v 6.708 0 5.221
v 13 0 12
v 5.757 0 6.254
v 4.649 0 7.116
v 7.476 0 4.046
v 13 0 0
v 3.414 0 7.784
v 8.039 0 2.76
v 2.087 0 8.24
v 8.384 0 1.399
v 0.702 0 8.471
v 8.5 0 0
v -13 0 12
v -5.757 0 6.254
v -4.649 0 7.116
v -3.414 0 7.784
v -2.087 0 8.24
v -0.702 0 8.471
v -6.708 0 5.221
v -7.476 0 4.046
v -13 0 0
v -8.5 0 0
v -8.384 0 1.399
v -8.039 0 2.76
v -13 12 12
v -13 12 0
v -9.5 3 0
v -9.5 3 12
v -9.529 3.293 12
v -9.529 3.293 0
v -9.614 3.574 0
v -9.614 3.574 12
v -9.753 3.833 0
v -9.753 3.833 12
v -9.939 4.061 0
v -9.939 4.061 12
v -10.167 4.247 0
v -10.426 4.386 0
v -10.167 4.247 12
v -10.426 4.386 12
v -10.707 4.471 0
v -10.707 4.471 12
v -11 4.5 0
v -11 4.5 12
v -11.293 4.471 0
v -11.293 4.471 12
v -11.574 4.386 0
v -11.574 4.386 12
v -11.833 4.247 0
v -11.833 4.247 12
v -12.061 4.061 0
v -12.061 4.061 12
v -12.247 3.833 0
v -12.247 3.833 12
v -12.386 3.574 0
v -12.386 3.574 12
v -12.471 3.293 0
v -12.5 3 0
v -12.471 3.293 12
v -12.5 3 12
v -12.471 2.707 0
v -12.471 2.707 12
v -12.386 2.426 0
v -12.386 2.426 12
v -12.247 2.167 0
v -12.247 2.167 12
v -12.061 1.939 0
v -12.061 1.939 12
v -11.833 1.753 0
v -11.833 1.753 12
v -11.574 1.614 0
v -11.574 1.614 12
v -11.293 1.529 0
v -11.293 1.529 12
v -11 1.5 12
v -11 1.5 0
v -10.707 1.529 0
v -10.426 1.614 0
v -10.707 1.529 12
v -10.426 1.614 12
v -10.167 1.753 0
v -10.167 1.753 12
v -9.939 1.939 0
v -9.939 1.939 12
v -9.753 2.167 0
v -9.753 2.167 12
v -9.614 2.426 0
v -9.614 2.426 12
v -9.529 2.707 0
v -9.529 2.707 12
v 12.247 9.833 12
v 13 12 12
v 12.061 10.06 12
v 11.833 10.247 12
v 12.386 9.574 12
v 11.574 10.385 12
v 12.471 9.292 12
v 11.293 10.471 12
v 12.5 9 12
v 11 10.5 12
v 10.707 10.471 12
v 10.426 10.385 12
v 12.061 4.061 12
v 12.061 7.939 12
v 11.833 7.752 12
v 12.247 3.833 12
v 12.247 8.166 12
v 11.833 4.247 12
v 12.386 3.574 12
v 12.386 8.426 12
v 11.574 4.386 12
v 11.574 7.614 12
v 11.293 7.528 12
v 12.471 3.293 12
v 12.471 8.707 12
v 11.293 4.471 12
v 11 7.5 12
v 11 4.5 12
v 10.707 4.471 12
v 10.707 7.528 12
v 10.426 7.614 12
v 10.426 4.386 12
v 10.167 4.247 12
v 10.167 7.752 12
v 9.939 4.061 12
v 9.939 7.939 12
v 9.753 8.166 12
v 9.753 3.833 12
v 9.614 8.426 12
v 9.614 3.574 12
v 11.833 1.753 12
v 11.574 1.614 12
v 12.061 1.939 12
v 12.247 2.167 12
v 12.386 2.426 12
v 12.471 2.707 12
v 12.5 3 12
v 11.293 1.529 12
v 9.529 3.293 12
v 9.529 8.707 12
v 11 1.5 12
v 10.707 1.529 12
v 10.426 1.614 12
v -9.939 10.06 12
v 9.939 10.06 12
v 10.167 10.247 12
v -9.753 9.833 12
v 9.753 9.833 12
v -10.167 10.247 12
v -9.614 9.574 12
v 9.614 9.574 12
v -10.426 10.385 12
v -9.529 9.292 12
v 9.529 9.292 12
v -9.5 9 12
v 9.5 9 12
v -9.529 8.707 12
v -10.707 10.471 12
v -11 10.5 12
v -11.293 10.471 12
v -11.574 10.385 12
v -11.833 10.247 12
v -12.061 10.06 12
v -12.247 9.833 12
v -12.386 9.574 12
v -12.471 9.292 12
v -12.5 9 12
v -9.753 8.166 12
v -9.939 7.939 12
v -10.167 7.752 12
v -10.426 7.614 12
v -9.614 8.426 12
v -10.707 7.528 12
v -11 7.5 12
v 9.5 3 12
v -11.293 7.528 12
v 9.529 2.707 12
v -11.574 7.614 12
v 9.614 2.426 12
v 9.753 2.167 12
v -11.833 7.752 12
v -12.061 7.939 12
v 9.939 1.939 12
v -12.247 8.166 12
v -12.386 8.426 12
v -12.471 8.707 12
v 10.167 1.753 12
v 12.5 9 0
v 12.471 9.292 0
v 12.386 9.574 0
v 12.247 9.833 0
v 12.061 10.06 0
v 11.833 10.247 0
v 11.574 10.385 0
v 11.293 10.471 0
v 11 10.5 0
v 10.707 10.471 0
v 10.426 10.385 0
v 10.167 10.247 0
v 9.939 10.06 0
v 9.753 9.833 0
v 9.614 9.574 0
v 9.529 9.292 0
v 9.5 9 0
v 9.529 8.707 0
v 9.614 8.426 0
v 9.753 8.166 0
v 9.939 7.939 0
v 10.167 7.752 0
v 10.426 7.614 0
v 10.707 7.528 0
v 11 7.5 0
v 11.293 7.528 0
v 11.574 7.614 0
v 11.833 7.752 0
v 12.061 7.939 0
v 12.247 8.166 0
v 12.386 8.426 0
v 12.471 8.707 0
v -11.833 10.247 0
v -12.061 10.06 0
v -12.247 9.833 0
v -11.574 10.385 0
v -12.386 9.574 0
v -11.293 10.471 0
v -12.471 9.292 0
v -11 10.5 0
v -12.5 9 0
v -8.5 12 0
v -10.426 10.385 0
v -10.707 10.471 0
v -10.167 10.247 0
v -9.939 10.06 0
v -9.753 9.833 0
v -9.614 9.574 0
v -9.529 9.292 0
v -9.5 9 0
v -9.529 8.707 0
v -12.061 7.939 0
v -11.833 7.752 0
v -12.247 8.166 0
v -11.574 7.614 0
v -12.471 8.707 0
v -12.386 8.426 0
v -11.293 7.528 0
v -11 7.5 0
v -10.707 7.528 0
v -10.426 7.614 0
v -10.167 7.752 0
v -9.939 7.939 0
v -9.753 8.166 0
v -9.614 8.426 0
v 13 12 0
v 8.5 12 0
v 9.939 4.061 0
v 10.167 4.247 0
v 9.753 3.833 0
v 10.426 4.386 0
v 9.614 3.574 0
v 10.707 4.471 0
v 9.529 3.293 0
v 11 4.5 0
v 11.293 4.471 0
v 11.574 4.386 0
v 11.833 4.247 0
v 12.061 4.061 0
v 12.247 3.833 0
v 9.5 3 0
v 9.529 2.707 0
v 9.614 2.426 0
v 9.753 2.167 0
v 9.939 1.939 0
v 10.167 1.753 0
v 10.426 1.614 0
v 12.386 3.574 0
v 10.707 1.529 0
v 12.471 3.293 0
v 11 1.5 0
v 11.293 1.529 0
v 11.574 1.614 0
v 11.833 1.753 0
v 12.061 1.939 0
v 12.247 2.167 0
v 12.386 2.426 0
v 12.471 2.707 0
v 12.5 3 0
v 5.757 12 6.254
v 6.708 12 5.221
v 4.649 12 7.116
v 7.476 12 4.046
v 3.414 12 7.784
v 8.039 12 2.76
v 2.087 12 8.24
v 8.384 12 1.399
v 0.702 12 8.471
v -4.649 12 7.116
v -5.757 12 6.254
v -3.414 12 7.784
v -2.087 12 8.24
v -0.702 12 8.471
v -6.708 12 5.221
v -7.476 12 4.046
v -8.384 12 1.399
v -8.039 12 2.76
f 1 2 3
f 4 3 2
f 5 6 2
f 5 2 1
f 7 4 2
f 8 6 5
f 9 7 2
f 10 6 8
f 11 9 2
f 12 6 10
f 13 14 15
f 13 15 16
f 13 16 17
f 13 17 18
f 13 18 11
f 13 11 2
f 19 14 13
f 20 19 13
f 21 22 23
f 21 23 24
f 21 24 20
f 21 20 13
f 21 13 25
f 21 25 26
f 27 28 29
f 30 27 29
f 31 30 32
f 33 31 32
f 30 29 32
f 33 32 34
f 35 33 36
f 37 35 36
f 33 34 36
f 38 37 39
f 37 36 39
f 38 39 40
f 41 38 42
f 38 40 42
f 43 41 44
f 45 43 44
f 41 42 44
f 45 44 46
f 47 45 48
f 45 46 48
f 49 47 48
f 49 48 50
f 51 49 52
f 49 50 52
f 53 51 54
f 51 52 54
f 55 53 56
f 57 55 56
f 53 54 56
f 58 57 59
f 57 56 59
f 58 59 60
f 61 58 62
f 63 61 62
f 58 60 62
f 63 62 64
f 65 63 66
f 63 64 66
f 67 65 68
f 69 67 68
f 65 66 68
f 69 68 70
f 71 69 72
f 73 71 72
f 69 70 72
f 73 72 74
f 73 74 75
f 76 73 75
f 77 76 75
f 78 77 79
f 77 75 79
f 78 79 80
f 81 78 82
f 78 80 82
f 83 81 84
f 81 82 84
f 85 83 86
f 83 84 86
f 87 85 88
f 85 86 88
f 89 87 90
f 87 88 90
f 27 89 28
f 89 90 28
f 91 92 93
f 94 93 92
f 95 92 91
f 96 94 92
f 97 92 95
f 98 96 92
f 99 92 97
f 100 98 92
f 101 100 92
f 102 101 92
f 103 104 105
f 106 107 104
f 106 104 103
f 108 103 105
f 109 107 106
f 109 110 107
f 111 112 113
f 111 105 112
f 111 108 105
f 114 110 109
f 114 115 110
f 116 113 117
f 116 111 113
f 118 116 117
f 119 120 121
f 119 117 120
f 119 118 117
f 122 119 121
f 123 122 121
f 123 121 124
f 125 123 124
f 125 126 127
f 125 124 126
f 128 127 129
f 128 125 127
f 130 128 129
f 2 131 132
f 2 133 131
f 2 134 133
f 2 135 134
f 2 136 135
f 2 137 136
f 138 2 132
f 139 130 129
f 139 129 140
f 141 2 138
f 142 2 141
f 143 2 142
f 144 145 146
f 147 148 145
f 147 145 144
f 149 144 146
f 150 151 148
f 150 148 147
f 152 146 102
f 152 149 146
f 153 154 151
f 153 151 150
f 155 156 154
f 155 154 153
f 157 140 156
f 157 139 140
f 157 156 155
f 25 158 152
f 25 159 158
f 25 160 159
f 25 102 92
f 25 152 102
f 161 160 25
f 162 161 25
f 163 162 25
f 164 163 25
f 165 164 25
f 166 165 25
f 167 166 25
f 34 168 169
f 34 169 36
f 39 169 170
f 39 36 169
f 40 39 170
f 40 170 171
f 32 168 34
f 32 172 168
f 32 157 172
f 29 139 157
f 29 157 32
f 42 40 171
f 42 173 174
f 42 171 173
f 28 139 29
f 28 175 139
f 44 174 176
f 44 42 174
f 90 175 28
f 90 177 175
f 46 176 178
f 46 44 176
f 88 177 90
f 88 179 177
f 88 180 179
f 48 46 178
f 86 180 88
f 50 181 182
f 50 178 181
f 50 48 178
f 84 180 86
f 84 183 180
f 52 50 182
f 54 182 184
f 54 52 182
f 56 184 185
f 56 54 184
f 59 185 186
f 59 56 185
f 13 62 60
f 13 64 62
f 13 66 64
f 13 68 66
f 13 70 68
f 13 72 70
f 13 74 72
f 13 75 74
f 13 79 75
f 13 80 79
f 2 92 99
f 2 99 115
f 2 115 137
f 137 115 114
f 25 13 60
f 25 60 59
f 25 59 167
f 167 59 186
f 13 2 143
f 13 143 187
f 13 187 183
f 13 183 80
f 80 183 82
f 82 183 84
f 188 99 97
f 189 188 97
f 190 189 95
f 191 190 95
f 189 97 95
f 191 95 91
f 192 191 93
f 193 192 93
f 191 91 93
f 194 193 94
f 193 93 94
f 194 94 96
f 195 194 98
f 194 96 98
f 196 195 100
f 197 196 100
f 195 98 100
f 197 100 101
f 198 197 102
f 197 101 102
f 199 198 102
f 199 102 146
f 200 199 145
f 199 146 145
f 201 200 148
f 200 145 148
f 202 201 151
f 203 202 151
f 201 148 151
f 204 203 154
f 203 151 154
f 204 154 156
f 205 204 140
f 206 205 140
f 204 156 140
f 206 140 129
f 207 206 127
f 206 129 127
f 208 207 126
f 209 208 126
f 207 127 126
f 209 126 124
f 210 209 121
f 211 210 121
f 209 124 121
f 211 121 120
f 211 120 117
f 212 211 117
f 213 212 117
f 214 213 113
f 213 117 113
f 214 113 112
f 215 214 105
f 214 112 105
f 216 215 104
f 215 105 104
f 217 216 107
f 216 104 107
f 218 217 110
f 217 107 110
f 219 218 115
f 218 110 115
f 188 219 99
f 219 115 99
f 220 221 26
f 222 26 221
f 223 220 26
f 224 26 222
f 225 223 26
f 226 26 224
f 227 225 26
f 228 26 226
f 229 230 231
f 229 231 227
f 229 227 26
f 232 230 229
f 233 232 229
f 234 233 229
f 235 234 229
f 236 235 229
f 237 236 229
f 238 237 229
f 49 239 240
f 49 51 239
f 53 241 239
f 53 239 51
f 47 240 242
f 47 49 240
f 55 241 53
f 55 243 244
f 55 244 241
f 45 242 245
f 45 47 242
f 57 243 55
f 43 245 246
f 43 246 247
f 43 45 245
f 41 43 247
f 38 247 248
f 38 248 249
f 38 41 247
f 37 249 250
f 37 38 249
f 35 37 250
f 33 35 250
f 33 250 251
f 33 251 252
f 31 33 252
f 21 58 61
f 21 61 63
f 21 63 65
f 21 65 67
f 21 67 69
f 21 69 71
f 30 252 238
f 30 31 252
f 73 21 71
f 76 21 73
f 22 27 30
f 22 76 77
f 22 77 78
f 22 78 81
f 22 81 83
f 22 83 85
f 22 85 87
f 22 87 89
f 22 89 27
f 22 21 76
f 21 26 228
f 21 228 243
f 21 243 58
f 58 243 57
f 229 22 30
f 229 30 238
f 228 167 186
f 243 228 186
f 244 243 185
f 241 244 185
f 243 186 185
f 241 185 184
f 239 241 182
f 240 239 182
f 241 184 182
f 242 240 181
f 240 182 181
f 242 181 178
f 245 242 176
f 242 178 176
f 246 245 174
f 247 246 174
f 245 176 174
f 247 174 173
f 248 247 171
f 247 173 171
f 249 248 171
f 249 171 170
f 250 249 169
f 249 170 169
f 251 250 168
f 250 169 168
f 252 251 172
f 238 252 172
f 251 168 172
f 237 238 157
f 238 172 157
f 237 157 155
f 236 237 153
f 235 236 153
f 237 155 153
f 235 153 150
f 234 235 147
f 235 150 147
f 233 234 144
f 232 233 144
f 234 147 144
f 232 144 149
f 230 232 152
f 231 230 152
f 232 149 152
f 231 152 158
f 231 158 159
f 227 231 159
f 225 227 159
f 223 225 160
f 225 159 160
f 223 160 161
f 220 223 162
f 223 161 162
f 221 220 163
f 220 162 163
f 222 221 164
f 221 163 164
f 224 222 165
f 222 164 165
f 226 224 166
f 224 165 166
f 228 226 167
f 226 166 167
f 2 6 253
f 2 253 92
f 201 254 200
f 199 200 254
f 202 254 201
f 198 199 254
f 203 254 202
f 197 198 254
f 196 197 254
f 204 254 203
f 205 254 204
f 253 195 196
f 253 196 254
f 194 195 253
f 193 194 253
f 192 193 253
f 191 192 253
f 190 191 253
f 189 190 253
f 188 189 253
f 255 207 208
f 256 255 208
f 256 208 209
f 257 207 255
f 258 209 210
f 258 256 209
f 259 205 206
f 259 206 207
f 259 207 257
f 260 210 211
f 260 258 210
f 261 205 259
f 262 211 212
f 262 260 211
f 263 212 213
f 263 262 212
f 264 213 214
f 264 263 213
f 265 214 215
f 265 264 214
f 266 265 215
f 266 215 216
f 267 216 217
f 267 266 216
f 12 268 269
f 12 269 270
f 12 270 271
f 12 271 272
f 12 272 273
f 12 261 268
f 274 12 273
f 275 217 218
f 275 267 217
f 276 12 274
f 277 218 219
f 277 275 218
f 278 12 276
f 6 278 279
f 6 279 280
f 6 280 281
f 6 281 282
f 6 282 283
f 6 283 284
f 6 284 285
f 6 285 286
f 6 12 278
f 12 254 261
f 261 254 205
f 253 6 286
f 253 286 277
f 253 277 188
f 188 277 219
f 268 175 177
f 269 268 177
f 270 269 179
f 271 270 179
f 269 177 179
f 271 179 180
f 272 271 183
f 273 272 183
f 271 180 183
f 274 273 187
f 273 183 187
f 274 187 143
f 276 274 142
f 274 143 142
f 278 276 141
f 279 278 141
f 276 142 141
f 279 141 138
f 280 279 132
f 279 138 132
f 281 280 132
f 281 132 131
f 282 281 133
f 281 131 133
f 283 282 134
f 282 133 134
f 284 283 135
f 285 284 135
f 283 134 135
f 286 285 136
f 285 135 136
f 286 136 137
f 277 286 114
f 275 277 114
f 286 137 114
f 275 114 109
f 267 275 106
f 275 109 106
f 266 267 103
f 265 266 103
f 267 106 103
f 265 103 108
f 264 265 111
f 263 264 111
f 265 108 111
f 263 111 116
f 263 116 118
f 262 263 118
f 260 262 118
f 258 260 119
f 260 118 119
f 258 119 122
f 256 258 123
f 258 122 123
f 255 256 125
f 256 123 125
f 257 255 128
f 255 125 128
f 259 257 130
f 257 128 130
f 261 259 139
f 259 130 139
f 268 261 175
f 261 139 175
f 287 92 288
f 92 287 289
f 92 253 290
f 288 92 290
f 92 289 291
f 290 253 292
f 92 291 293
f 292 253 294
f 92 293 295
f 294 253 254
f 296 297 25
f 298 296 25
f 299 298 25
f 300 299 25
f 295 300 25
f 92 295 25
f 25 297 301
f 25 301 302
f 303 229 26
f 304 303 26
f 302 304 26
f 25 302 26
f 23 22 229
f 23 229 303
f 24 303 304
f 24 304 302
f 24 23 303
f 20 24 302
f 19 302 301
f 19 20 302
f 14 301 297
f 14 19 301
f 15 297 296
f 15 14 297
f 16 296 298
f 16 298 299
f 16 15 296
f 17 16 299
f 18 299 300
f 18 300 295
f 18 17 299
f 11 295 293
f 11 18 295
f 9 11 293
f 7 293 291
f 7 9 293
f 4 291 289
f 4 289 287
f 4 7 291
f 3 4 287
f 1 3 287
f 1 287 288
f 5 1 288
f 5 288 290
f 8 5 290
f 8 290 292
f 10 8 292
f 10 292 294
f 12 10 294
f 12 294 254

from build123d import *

# Parameters (mm, degrees)
EXTRUDE_1_DEPTH     = 12
SKETCH_2_R          = 1.5
CUT_EXTRUDE_1_DEPTH = 12


with BuildPart() as part:
    # 草图1 → 凸台-拉伸1 (new body)
    with BuildSketch(Plane(origin=(0, 0, 0), x_dir=(1, 0, 0), z_dir=(0, 1, 0))):
        with BuildLine():
            Line((-13, 0), (-8.5, 0))
            ThreePointArc((-8.5, 0), (0, -8.5), (8.5, 0))
            Line((8.5, 0), (13, 0))
            Line((13, 0), (13, -12))
            Line((13, -12), (-13, -12))
            Line((-13, -12), (-13, 0))
        make_face()
    extrude(amount=EXTRUDE_1_DEPTH)

    # 草图2 → 切除-拉伸1 (cut)
    with BuildSketch(Plane.XY.offset(12)):
        with Locations((-11, 3)):
            Circle(SKETCH_2_R)
        with Locations(Location((11, 3, 0), (0, 0, 180))):
            Circle(SKETCH_2_R)
        with Locations((11, 8.999543006)):
            Circle(SKETCH_2_R)
        with Locations(Location((-11, 8.999543006, 0), (0, 0, 180))):
            Circle(SKETCH_2_R)
    extrude(amount=-CUT_EXTRUDE_1_DEPTH, mode=Mode.SUBTRACT)


solid = part.part
